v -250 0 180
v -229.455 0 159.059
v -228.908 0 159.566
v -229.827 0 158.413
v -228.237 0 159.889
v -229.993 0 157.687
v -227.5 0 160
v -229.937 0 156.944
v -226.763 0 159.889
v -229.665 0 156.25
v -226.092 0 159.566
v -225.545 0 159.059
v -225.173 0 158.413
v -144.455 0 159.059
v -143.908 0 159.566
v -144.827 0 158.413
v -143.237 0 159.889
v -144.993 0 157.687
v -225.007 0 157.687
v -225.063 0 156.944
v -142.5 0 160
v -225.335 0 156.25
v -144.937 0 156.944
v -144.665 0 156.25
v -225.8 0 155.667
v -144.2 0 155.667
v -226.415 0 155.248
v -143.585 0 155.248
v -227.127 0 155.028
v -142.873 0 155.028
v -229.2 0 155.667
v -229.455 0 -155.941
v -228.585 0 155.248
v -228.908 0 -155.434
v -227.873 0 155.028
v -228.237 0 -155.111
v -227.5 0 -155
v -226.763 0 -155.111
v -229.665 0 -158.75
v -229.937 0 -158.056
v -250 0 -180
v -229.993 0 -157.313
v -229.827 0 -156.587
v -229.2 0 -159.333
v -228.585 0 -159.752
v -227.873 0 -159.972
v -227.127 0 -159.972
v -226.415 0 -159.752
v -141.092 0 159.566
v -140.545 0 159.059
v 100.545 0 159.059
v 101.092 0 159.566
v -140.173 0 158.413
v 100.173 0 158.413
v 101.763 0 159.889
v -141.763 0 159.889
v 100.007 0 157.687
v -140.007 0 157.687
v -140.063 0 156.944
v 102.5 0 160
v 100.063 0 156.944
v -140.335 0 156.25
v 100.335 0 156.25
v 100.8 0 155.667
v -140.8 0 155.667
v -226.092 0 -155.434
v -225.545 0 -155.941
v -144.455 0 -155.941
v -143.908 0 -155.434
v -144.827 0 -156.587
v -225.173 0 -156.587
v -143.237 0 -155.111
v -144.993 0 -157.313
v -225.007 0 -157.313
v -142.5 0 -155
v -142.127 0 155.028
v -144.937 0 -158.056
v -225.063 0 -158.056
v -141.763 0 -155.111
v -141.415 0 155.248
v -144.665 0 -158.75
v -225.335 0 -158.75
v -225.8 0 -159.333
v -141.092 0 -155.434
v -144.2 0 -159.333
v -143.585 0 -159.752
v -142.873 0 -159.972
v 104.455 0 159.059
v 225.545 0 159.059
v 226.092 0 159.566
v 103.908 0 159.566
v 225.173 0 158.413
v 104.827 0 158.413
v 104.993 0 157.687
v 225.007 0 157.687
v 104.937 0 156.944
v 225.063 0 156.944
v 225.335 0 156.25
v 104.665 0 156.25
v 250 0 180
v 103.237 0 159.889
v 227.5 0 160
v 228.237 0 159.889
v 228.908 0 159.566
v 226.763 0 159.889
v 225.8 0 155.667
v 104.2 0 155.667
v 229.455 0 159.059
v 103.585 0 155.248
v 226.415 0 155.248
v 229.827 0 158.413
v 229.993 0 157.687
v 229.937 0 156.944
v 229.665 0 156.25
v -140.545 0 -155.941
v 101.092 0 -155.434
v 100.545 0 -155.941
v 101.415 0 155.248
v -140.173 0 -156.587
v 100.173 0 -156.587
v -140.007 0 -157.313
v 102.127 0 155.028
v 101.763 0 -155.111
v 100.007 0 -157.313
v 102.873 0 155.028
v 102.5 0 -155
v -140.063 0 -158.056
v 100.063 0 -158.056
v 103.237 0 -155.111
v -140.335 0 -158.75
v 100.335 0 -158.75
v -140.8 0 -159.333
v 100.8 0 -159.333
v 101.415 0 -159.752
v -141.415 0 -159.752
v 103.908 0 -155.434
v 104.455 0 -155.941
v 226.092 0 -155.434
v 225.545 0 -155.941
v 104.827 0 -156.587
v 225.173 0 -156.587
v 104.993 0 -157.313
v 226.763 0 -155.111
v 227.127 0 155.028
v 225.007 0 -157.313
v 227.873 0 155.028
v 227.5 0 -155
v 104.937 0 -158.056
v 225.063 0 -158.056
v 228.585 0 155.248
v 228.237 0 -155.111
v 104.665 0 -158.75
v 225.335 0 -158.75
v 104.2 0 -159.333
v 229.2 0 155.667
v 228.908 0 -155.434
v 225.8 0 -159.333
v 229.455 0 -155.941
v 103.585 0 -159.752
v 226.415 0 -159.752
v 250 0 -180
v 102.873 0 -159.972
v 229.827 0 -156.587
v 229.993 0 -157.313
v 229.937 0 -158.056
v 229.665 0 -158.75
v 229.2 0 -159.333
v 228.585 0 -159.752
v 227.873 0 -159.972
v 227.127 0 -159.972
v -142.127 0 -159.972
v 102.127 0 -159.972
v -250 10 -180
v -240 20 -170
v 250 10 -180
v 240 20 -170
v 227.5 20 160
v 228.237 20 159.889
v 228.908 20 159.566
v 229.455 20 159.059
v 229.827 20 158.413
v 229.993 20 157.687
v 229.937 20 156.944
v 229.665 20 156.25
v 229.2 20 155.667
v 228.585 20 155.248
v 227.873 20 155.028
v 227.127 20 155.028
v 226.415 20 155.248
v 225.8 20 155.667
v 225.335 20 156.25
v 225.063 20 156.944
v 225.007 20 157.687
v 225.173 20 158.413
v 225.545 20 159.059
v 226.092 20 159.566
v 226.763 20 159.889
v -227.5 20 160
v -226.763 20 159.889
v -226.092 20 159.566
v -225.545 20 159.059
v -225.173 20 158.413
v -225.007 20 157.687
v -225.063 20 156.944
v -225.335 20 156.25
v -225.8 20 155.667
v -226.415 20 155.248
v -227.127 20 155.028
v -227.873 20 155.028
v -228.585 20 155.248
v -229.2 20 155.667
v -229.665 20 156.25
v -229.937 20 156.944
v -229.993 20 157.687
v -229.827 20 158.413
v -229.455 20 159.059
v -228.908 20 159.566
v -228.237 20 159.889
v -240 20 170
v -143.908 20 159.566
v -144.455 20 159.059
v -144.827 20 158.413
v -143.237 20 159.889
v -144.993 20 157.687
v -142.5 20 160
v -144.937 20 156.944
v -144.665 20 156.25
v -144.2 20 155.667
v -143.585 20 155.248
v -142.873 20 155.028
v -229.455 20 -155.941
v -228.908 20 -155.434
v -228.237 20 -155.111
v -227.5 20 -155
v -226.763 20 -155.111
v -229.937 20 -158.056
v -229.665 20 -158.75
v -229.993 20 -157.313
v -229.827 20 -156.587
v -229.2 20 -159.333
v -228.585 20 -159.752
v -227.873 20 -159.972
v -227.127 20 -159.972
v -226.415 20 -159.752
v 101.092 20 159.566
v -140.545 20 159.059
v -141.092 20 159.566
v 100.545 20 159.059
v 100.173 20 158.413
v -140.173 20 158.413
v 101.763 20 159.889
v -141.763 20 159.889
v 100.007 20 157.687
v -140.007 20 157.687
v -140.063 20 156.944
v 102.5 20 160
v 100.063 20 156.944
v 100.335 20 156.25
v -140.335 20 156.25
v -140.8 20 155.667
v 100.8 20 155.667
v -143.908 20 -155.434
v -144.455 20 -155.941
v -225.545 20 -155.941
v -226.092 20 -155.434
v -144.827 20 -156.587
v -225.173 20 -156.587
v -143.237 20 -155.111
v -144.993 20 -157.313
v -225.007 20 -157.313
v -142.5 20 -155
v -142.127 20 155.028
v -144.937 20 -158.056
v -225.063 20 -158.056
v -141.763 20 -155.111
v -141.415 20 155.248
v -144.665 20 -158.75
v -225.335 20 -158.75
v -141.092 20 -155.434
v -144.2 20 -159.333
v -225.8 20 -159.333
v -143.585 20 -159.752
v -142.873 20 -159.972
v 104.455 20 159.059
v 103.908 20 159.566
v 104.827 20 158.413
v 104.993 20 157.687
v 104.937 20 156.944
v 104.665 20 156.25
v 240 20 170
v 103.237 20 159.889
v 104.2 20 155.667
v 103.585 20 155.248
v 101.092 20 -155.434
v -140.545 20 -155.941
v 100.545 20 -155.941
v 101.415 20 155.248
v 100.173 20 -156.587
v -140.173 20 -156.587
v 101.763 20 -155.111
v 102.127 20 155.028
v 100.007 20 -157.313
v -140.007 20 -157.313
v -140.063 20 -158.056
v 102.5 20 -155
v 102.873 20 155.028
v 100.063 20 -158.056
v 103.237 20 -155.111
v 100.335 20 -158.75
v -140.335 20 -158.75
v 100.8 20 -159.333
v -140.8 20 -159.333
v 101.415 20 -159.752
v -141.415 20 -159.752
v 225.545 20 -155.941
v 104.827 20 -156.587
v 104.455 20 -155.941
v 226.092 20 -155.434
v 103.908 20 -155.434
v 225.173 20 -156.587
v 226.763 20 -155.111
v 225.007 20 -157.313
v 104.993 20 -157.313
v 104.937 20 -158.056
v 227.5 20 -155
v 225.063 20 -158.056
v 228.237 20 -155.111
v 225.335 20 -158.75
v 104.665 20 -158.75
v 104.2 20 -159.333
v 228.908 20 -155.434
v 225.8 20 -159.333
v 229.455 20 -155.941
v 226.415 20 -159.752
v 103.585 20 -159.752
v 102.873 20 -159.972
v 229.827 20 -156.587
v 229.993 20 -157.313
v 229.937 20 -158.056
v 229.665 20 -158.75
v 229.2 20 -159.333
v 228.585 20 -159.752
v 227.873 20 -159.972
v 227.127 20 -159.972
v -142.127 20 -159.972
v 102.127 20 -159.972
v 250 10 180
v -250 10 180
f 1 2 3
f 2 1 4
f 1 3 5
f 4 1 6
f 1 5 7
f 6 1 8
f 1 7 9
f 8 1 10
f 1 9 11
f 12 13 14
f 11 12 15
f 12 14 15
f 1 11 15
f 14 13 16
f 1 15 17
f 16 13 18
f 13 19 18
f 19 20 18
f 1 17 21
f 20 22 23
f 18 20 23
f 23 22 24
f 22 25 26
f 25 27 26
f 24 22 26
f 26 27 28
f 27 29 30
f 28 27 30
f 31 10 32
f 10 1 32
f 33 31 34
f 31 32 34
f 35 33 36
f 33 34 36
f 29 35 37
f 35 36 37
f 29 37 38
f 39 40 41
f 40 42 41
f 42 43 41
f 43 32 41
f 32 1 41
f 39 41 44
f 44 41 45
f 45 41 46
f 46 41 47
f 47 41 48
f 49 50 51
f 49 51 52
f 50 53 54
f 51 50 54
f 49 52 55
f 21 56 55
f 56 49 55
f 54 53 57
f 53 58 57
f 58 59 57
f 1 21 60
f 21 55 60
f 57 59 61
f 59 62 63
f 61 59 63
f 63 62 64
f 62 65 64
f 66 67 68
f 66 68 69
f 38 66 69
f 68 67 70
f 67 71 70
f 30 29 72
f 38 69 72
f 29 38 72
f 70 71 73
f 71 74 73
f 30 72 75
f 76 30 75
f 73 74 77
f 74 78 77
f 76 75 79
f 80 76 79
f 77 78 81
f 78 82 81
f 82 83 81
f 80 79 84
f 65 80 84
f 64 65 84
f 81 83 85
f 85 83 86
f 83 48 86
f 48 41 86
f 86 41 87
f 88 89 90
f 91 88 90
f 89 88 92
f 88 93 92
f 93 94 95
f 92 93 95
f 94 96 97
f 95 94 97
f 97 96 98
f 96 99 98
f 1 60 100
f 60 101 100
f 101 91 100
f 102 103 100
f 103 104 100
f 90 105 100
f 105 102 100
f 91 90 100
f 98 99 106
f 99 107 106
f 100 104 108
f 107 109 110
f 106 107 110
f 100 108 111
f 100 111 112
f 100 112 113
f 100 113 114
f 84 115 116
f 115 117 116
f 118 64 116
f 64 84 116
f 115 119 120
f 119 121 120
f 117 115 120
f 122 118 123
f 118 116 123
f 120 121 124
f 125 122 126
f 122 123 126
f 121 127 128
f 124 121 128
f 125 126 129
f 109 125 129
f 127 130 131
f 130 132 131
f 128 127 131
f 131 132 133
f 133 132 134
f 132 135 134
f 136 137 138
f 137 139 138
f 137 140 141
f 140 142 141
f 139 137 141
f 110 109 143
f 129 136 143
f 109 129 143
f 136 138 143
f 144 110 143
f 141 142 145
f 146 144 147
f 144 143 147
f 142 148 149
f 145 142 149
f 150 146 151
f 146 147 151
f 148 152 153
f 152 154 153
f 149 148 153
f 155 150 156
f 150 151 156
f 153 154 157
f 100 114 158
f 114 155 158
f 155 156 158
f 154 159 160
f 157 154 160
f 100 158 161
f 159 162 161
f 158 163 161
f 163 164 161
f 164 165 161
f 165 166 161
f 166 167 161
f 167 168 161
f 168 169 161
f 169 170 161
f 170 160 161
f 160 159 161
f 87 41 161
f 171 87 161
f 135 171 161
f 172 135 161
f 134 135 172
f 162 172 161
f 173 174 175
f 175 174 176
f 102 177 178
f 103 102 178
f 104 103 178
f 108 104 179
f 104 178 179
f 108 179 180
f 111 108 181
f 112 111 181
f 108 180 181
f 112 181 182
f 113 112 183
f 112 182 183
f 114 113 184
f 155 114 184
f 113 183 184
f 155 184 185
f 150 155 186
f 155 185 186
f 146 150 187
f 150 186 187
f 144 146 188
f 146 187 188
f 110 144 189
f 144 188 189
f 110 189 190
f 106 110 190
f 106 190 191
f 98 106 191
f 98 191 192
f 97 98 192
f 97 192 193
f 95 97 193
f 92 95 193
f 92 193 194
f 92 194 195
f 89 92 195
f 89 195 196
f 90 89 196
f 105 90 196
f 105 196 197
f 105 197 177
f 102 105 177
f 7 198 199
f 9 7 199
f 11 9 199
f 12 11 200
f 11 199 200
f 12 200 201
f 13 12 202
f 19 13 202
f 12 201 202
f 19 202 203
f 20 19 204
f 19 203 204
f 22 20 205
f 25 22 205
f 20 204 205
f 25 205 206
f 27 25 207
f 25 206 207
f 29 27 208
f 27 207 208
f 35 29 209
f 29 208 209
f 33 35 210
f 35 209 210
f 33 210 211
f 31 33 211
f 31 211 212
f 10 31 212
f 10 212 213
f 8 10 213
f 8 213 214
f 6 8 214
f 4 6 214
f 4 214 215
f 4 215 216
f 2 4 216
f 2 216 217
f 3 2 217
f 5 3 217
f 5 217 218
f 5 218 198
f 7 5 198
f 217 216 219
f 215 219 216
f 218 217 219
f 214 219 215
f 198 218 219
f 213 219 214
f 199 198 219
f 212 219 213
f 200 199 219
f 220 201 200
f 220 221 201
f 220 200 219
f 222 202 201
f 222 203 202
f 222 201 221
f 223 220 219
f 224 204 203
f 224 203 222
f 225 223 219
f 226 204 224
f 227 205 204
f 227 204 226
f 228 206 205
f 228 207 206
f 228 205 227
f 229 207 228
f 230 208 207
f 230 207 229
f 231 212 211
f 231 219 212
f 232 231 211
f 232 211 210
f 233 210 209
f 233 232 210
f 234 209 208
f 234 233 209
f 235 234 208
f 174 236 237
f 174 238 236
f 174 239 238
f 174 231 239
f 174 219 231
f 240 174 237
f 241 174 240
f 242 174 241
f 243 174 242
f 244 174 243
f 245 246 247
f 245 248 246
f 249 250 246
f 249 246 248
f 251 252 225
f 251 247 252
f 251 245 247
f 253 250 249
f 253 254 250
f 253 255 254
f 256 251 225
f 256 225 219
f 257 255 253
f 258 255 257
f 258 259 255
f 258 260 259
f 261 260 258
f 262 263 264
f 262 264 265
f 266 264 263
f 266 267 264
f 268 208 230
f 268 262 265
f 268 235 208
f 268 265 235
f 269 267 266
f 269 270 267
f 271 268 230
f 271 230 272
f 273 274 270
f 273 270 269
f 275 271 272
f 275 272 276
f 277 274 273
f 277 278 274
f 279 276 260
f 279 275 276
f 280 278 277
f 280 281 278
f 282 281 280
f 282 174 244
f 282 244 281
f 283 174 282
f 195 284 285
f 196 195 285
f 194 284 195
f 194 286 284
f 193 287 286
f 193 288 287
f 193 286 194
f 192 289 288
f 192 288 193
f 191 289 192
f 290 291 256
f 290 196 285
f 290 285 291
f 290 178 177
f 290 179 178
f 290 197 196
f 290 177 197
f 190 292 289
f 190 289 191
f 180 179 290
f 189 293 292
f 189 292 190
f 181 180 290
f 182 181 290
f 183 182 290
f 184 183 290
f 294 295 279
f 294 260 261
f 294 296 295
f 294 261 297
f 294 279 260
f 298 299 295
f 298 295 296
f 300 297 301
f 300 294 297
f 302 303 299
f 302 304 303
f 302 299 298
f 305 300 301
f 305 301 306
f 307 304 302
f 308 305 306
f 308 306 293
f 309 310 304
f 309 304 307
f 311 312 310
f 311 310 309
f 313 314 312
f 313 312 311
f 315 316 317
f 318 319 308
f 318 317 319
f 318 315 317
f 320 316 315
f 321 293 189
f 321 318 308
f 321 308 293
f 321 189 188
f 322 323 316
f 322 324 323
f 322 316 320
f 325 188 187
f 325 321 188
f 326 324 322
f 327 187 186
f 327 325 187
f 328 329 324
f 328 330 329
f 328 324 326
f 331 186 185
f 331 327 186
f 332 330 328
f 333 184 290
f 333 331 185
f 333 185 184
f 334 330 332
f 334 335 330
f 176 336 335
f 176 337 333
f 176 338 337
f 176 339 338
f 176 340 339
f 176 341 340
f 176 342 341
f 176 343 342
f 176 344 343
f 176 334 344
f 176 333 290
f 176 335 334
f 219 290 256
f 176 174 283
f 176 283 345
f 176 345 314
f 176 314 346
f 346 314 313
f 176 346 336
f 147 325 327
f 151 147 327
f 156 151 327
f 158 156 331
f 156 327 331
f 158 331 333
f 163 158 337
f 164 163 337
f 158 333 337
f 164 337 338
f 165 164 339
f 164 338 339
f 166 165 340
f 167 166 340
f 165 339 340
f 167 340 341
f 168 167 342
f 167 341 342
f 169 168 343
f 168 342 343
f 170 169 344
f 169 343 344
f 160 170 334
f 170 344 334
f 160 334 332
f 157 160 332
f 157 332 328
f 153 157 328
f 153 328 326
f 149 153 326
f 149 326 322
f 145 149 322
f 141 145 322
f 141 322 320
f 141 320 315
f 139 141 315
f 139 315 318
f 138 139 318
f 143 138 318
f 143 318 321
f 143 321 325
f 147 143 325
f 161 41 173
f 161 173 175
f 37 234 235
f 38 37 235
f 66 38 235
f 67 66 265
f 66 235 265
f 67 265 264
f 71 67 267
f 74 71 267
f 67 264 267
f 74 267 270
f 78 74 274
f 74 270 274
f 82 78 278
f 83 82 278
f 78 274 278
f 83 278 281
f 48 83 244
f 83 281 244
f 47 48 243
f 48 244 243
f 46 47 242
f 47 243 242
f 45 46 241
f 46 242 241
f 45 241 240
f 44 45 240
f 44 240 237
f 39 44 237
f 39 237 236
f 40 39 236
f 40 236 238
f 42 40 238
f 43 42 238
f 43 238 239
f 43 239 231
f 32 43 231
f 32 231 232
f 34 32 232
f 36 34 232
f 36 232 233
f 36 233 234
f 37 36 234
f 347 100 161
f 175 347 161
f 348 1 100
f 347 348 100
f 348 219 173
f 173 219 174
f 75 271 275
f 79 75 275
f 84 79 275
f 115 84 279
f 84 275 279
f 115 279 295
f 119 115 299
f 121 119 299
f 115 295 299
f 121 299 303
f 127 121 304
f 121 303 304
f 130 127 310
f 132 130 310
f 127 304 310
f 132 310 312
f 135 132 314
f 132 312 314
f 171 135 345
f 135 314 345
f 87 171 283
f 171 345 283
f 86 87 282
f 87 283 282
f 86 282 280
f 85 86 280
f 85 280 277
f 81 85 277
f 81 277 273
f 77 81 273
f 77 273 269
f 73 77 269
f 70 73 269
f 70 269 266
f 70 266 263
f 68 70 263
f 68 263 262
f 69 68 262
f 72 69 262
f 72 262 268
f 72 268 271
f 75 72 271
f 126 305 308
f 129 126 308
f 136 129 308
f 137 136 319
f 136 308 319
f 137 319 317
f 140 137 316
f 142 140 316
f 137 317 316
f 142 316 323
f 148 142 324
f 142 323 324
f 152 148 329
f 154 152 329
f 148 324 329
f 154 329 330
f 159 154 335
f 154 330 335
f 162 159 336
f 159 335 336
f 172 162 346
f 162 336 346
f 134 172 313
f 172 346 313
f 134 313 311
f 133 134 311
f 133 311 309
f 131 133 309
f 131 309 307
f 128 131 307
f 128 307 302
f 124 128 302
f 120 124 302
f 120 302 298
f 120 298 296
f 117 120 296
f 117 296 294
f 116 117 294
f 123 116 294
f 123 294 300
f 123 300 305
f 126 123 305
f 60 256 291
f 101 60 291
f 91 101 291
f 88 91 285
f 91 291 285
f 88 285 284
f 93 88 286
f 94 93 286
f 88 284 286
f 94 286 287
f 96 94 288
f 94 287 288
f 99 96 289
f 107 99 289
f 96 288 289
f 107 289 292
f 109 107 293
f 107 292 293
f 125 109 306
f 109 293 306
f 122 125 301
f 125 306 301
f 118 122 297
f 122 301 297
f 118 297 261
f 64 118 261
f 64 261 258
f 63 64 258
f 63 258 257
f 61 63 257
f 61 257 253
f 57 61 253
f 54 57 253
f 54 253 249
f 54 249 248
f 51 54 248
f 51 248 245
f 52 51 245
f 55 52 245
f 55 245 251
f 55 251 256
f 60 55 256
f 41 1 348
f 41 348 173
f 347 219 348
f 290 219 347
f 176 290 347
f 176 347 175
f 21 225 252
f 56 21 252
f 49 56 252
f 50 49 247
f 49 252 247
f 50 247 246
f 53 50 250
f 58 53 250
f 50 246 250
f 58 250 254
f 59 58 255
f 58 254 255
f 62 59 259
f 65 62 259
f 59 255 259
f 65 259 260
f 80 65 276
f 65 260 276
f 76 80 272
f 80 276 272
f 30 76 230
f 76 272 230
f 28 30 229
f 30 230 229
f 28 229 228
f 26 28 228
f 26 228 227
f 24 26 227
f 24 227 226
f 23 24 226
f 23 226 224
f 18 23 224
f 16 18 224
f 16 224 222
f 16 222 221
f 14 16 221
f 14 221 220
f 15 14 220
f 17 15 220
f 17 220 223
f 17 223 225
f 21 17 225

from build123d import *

# Parameters (mm, degrees)
SKIZZE1_W                       = 500
SKIZZE1_H                       = 360
AUFSATZ_LINEAR_AUSTRAGEN1_DEPTH = 20
FASE1_SIZE                      = 10
SKIZZE2_R                       = 2.5
SCHNITT_LINEAR_AUSTRAGEN1_DEPTH = 309.706980809


with BuildPart() as part:
    # Skizze1 → Aufsatz-Linear austragen1 (new body)
    with BuildSketch(Plane(origin=(0, 0, 0), x_dir=(1, 0, 0), z_dir=(0, 1, 0))):
        Rectangle(SKIZZE1_W, SKIZZE1_H)
    extrude(amount=AUFSATZ_LINEAR_AUSTRAGEN1_DEPTH)

    # Fase1
    fase1_edges = [part.edges().sort_by_distance(p)[0] for p in [
        (-250, 20, 0),
        (0, 20, 180),
        (250, 20, 0),
        (0, 20, -180),
    ]]
    chamfer(fase1_edges, length=FASE1_SIZE)

    # Skizze2 → Schnitt-Linear austragen1 (cut, through all)
    with BuildSketch(Plane(origin=(0, 20, 0), x_dir=(1, 0, 0), z_dir=(0, 1, 0))):
        with Locations(Location((-227.5, -157.5, 0), (0, 0, 270))):
            Circle(SKIZZE2_R)
        with Locations(Location((-142.5, -157.5, 0), (0, 0, 270))):
            Circle(SKIZZE2_R)
        with Locations(Location((102.5, -157.5, 0), (0, 0, 270))):
            Circle(SKIZZE2_R)
        with Locations(Location((227.5, -157.5, 0), (0, 0, 270))):
            Circle(SKIZZE2_R)
        with Locations(Location((-227.5, 157.5, 0), (0, 0, 270))):
            Circle(SKIZZE2_R)
        with Locations(Location((-142.5, 157.5, 0), (0, 0, 270))):
            Circle(SKIZZE2_R)
        with Locations(Location((102.5, 157.5, 0), (0, 0, 270))):
            Circle(SKIZZE2_R)
        with Locations(Location((227.5, 157.5, 0), (0, 0, 270))):
            Circle(SKIZZE2_R)
    extrude(amount=-SCHNITT_LINEAR_AUSTRAGEN1_DEPTH, mode=Mode.SUBTRACT)


solid = part.part
